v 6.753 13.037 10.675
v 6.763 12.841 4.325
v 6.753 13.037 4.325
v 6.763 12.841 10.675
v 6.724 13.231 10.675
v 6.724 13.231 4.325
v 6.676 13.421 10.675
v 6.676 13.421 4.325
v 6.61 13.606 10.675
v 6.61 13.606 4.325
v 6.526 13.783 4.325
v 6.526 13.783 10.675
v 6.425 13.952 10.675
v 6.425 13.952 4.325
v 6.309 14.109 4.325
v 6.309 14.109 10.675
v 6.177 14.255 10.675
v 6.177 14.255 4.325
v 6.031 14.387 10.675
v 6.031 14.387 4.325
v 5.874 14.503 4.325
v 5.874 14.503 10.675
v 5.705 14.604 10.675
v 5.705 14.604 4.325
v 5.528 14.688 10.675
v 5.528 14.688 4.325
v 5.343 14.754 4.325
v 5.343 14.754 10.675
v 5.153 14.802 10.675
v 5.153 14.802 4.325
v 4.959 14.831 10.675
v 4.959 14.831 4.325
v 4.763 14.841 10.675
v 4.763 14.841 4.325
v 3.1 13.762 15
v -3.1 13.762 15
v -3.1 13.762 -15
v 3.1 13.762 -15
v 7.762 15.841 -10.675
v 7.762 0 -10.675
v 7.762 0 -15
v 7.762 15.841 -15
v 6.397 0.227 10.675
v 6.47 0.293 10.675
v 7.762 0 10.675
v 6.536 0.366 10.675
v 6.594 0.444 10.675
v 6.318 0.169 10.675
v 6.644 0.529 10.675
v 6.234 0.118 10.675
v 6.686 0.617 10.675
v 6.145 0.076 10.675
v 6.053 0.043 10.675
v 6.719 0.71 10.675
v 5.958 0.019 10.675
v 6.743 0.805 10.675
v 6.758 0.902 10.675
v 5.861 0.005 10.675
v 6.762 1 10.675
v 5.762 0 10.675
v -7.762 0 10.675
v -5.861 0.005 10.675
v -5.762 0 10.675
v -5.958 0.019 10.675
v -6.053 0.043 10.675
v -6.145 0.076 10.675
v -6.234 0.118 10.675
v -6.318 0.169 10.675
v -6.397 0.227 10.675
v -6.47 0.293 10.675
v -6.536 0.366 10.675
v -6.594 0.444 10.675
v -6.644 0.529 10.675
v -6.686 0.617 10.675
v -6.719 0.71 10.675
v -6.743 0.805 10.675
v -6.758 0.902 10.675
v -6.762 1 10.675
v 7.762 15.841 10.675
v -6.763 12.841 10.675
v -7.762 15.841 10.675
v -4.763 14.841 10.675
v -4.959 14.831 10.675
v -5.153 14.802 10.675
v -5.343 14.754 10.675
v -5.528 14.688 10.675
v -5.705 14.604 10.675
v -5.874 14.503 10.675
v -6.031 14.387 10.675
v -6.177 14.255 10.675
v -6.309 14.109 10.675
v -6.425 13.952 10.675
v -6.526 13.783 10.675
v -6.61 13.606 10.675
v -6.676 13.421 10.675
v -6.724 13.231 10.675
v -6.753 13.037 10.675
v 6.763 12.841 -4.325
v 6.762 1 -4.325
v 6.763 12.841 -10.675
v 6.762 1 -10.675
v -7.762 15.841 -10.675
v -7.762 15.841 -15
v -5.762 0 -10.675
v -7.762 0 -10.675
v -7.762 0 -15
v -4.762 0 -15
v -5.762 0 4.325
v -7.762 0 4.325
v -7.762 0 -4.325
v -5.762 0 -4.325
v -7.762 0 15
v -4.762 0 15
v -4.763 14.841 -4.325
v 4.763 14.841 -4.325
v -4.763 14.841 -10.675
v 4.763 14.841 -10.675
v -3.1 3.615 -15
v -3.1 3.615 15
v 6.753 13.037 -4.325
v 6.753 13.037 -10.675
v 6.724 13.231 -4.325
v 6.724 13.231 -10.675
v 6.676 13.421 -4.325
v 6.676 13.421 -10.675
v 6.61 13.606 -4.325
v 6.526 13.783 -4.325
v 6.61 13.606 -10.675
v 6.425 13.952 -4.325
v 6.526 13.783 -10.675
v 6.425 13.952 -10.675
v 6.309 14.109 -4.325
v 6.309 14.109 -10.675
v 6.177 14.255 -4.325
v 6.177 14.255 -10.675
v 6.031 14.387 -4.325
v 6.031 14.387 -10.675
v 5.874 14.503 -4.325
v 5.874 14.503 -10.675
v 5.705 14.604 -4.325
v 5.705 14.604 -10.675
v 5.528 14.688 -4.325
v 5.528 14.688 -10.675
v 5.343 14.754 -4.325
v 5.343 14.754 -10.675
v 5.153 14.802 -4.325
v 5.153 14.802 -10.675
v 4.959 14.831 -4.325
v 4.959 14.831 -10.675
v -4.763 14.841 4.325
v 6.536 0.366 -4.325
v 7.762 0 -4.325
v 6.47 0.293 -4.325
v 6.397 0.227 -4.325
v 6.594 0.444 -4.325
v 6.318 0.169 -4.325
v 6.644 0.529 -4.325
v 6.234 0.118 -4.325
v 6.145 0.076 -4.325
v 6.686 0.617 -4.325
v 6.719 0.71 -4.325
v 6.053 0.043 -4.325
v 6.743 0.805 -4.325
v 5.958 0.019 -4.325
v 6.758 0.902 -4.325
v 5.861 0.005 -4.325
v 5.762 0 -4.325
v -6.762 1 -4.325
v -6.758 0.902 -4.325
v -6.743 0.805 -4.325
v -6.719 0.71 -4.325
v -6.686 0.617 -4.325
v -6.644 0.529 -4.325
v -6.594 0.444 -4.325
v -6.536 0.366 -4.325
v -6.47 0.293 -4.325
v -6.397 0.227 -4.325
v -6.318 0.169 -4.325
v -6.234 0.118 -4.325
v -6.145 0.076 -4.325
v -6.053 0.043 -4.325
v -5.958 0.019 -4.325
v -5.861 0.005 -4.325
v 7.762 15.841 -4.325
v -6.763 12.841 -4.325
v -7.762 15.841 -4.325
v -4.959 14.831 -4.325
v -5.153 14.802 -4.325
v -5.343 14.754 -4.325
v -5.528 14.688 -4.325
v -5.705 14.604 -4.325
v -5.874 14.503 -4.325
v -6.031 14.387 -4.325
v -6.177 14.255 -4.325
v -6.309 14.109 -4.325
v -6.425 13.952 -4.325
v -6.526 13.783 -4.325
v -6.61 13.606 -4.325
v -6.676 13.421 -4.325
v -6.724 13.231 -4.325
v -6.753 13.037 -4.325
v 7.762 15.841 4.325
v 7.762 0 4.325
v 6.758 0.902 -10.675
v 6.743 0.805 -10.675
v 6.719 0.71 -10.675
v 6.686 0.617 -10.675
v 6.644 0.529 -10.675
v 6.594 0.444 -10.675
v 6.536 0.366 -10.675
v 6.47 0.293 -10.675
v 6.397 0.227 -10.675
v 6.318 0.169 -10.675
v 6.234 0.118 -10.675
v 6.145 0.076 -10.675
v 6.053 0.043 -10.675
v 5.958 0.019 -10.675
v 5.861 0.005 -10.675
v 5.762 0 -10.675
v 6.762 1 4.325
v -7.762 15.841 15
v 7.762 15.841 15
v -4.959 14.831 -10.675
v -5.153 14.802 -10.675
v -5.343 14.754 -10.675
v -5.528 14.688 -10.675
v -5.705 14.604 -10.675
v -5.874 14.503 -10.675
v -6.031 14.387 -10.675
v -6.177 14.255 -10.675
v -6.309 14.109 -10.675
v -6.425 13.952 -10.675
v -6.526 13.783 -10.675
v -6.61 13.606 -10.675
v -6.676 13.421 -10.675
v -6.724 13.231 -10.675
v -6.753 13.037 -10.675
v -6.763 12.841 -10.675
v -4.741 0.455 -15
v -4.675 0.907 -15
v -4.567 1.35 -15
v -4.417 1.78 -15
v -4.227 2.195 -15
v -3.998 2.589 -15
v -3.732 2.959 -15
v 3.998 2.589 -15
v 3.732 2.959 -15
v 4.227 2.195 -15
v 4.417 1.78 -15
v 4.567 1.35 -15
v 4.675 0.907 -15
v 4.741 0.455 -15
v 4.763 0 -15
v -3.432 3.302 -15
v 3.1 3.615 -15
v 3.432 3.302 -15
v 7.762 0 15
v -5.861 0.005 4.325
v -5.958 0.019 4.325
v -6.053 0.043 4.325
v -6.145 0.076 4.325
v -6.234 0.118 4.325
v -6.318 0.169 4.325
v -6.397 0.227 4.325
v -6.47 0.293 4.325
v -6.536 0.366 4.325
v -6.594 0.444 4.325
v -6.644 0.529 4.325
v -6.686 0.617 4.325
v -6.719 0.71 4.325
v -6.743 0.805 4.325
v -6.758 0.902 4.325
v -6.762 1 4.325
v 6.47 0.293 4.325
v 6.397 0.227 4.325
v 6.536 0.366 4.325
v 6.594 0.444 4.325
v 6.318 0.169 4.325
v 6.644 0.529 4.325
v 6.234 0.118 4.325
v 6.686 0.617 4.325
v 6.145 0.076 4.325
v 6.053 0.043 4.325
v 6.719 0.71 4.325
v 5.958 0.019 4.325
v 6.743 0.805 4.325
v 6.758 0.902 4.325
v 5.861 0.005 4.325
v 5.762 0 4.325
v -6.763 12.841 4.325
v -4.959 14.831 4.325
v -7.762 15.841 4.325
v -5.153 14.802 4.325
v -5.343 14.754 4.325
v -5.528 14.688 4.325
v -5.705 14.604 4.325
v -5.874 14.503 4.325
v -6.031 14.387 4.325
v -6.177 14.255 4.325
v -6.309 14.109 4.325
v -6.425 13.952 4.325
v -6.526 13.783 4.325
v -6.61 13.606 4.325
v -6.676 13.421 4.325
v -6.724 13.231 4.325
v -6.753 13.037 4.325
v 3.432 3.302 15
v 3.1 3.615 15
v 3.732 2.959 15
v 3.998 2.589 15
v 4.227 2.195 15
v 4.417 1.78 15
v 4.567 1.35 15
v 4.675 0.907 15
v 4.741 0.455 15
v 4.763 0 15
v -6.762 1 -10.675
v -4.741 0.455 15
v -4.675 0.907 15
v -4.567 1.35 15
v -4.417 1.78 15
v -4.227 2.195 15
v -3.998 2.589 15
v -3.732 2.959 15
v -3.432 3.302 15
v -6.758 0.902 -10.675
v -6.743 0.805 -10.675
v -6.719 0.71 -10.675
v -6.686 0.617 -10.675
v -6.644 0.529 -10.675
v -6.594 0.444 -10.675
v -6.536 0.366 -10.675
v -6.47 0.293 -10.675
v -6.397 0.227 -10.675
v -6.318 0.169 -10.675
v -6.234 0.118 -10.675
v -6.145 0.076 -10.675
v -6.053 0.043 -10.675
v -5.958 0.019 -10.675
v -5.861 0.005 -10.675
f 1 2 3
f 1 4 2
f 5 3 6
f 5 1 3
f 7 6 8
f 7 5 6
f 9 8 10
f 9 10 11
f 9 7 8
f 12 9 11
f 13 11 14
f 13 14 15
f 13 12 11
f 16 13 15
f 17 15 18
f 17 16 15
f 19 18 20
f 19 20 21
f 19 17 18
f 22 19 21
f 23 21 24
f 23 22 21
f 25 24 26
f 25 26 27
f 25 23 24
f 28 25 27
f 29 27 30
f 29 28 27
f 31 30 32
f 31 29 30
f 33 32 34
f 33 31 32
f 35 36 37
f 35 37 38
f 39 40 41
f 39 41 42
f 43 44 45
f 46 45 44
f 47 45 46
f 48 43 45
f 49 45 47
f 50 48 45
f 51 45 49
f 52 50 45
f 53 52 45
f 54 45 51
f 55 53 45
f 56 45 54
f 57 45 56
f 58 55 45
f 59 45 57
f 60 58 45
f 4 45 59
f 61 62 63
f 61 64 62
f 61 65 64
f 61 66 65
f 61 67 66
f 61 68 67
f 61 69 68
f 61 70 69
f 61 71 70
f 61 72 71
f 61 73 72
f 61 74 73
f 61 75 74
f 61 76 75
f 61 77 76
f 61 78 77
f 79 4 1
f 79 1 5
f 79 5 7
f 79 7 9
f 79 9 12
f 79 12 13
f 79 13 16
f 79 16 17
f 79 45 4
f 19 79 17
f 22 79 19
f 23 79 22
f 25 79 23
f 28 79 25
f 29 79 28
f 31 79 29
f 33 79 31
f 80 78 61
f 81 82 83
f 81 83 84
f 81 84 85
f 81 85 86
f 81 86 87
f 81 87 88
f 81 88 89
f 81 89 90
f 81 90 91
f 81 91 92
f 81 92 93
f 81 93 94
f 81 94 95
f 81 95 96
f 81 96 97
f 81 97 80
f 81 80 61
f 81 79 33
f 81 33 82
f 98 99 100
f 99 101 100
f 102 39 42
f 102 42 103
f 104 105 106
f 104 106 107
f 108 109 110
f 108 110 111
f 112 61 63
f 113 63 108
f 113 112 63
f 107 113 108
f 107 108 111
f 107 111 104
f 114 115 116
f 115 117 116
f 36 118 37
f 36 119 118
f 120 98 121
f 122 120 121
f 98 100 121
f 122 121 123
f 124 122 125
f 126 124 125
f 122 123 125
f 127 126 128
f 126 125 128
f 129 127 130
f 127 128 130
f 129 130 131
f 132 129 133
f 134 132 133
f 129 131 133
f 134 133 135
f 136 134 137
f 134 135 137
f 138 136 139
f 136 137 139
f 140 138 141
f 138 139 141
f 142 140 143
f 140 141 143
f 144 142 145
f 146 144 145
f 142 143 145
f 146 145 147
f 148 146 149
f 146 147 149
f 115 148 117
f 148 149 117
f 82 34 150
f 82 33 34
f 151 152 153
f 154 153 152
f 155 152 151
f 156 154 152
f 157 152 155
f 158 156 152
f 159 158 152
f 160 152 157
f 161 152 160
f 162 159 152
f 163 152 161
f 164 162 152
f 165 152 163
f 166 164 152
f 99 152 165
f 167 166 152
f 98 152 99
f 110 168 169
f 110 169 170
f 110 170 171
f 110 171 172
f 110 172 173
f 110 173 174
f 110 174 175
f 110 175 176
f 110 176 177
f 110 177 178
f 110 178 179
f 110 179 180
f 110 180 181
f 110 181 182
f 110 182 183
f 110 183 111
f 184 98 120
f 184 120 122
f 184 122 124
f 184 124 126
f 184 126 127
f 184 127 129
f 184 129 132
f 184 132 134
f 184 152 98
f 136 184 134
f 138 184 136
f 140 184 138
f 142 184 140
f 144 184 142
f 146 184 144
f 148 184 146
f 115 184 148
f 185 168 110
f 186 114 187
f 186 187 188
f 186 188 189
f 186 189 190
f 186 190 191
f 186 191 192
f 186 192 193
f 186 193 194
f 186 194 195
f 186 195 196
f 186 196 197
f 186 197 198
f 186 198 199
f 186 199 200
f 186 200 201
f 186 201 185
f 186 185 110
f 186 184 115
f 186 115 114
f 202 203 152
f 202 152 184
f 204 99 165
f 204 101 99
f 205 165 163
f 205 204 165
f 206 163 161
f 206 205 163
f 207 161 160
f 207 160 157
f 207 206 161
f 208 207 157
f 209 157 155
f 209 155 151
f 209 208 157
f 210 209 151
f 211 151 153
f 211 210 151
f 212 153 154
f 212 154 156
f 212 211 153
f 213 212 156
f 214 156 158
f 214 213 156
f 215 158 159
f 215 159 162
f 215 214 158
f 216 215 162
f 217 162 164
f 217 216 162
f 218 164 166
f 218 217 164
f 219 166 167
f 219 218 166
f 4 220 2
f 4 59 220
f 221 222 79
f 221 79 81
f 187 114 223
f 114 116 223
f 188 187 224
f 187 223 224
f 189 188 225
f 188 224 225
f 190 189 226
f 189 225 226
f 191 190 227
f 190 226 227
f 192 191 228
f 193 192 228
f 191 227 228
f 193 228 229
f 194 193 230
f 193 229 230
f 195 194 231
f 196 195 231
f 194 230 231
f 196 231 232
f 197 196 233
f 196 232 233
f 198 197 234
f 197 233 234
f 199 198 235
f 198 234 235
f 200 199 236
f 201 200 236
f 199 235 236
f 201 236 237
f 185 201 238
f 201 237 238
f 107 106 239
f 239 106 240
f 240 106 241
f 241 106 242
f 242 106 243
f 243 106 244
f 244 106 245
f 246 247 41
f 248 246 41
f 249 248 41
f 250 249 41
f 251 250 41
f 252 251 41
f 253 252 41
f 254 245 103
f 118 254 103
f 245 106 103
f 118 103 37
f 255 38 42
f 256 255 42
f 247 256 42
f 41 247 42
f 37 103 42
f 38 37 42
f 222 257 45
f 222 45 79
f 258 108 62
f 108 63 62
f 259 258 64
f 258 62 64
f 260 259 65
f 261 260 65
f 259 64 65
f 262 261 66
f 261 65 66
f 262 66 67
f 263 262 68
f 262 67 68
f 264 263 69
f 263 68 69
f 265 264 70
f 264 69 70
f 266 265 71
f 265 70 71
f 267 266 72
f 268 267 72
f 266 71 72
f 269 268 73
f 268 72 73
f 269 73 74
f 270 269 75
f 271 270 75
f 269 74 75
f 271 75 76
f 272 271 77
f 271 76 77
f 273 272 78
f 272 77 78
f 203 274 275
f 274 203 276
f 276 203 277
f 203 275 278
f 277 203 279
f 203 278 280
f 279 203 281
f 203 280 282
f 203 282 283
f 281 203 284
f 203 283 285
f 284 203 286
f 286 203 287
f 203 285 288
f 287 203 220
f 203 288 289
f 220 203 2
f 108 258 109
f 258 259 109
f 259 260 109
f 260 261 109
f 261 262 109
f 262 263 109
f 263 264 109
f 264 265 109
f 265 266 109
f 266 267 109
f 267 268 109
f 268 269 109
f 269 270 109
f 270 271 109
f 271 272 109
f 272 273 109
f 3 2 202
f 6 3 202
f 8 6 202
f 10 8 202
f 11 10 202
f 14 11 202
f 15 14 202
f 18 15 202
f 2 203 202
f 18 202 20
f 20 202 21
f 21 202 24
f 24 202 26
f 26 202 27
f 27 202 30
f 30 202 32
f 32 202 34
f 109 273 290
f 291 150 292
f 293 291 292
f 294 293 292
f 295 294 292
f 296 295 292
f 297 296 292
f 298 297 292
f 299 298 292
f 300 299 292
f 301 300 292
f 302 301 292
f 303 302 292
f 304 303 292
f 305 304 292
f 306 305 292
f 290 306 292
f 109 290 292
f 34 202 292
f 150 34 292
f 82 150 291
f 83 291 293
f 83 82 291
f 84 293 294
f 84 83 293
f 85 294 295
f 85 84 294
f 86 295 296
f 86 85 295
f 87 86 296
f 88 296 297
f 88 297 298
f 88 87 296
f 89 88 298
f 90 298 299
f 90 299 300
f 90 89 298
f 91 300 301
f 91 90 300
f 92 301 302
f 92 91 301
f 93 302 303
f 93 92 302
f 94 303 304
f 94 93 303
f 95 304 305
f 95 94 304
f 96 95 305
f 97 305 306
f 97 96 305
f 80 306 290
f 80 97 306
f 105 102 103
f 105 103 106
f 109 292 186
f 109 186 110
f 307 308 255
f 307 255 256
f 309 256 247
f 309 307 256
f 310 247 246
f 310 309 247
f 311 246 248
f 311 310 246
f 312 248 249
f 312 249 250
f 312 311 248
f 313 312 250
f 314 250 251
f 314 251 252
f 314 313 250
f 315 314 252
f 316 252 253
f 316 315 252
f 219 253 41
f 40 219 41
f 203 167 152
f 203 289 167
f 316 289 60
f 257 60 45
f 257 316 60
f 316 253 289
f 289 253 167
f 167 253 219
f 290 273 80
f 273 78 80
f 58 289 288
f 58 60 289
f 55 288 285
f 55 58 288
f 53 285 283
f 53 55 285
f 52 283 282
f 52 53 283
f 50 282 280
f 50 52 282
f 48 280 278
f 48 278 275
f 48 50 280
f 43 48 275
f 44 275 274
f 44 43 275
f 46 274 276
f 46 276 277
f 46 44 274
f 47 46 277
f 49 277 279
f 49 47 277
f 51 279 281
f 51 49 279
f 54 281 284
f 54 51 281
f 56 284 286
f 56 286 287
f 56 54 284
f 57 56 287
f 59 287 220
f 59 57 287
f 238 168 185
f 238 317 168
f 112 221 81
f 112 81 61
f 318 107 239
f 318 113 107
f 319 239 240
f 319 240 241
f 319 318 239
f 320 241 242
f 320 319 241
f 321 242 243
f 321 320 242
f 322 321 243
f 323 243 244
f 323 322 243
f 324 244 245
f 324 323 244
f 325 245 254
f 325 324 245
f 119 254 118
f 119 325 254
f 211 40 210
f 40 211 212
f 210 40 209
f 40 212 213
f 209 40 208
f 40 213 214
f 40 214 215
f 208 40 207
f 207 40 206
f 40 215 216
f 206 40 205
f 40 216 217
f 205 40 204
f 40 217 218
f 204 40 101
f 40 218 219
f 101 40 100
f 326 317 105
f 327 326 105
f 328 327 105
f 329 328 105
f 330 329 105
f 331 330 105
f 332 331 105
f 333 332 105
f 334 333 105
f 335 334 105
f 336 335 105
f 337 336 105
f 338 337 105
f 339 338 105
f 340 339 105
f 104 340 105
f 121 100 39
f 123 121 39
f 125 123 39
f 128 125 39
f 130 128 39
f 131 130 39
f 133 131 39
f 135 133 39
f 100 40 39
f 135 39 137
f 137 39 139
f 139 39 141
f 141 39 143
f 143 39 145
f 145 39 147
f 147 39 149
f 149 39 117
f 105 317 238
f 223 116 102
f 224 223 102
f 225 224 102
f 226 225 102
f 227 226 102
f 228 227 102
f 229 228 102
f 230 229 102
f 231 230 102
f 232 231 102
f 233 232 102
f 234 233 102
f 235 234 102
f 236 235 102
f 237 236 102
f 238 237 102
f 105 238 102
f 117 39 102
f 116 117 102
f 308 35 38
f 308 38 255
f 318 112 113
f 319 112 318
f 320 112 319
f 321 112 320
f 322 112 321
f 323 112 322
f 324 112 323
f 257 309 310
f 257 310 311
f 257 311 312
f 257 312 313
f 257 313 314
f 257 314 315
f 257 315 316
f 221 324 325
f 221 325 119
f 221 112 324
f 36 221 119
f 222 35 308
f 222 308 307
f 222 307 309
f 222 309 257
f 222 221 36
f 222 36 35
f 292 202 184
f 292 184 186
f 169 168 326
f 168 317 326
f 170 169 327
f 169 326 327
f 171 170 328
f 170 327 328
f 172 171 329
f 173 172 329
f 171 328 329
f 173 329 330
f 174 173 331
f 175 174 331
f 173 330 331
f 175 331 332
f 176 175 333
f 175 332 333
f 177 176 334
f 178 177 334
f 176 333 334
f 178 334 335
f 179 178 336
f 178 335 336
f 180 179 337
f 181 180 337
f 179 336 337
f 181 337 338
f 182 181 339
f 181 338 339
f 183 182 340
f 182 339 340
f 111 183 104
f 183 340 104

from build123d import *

# Parameters (mm, degrees)
BOSS_EXTRUDE1_DEPTH  = 15
CUT_EXTRUDE1_DEPTH   = 3.175
MIRROR4_COPY_1_DEPTH = 3.175
FILLET1_R            = 2
FILLET2_R            = 1


with BuildPart() as part:
    # Sketch1 → Boss-Extrude1 (new, symmetric)
    with BuildSketch(Plane.XY):
        with BuildLine():
            Line((-3.1, 3.61543998), (-3.1, 13.7625))
            Line((-3.1, 13.7625), (3.1, 13.7625))
            Line((3.1, 13.7625), (3.1, 3.61543998))
            ThreePointArc((3.1, 3.61543998), (4.326959455, 1.989680408), (4.7625, 0))
            Line((4.7625, 0), (7.7625, 0))
            Line((7.7625, 0), (7.7625, 15.84052737))
            Line((7.7625, 15.84052737), (-7.7625, 15.84052737))
            Line((-7.7625, 15.84052737), (-7.7625, 0))
            Line((-7.7625, 0), (-4.7625, 0))
            ThreePointArc((-4.7625, 0), (-4.326959455, 1.989680408), (-3.1, 3.61543998))
        make_face()
    extrude(amount=BOSS_EXTRUDE1_DEPTH, both=True)

    # Sketch2 → Cut-Extrude1 (cut, symmetric)
    with BuildSketch(Plane.XY.offset(7.5)):
        Polygon((-7.7625, 15.84052737), (-7.7625, 0), (-6.7625, 0), (-6.7625, 14.84052737), (0, 14.84052737), (0, 15.84052737), align=None)
    cut_extrude1 = extrude(amount=CUT_EXTRUDE1_DEPTH, both=True, mode=Mode.SUBTRACT)

    # Mirror3: Cut-Extrude1 across plane
    add(cut_extrude1.mirror(Plane(origin=(0, 0, 0), x_dir=(0, 0, 1), z_dir=(1, 0, 0))), mode=Mode.SUBTRACT)

    # Mirror4: Cut-Extrude1 across plane
    add(cut_extrude1.mirror(Plane.XY), mode=Mode.SUBTRACT)

    # Mirror4 copy 1 sketch → Mirror4 copy 1 (cut, symmetric)
    with BuildSketch(Plane(origin=(0, 0, -7.5), x_dir=(-1, 0, 0), z_dir=(0, 0, -1))):
        Polygon((-7.7625, 15.84052737), (-7.7625, 0), (-6.7625, 0), (-6.7625, 14.84052737), (0, 14.84052737), (0, 15.84052737), align=None)
    extrude(amount=MIRROR4_COPY_1_DEPTH, both=True, mode=Mode.SUBTRACT)

    # Fillet1
    fillet1_edges = [part.edges().sort_by_distance(p)[0] for p in [
        (-6.7625, 14.84052737, 7.5),
        (6.7625, 14.84052737, 7.5),
        (-6.7625, 14.84052737, -7.5),
        (6.7625, 14.84052737, -7.5),
    ]]
    fillet(fillet1_edges, radius=FILLET1_R)

    # Fillet2
    fillet2_edges = [part.edges().sort_by_distance(p)[0] for p in [
        (-6.7625, 0, 7.5),
        (6.7625, 0, 7.5),
        (-6.7625, 0, -7.5),
        (6.7625, 0, -7.5),
    ]]
    fillet(fillet2_edges, radius=FILLET2_R)


solid = part.part
